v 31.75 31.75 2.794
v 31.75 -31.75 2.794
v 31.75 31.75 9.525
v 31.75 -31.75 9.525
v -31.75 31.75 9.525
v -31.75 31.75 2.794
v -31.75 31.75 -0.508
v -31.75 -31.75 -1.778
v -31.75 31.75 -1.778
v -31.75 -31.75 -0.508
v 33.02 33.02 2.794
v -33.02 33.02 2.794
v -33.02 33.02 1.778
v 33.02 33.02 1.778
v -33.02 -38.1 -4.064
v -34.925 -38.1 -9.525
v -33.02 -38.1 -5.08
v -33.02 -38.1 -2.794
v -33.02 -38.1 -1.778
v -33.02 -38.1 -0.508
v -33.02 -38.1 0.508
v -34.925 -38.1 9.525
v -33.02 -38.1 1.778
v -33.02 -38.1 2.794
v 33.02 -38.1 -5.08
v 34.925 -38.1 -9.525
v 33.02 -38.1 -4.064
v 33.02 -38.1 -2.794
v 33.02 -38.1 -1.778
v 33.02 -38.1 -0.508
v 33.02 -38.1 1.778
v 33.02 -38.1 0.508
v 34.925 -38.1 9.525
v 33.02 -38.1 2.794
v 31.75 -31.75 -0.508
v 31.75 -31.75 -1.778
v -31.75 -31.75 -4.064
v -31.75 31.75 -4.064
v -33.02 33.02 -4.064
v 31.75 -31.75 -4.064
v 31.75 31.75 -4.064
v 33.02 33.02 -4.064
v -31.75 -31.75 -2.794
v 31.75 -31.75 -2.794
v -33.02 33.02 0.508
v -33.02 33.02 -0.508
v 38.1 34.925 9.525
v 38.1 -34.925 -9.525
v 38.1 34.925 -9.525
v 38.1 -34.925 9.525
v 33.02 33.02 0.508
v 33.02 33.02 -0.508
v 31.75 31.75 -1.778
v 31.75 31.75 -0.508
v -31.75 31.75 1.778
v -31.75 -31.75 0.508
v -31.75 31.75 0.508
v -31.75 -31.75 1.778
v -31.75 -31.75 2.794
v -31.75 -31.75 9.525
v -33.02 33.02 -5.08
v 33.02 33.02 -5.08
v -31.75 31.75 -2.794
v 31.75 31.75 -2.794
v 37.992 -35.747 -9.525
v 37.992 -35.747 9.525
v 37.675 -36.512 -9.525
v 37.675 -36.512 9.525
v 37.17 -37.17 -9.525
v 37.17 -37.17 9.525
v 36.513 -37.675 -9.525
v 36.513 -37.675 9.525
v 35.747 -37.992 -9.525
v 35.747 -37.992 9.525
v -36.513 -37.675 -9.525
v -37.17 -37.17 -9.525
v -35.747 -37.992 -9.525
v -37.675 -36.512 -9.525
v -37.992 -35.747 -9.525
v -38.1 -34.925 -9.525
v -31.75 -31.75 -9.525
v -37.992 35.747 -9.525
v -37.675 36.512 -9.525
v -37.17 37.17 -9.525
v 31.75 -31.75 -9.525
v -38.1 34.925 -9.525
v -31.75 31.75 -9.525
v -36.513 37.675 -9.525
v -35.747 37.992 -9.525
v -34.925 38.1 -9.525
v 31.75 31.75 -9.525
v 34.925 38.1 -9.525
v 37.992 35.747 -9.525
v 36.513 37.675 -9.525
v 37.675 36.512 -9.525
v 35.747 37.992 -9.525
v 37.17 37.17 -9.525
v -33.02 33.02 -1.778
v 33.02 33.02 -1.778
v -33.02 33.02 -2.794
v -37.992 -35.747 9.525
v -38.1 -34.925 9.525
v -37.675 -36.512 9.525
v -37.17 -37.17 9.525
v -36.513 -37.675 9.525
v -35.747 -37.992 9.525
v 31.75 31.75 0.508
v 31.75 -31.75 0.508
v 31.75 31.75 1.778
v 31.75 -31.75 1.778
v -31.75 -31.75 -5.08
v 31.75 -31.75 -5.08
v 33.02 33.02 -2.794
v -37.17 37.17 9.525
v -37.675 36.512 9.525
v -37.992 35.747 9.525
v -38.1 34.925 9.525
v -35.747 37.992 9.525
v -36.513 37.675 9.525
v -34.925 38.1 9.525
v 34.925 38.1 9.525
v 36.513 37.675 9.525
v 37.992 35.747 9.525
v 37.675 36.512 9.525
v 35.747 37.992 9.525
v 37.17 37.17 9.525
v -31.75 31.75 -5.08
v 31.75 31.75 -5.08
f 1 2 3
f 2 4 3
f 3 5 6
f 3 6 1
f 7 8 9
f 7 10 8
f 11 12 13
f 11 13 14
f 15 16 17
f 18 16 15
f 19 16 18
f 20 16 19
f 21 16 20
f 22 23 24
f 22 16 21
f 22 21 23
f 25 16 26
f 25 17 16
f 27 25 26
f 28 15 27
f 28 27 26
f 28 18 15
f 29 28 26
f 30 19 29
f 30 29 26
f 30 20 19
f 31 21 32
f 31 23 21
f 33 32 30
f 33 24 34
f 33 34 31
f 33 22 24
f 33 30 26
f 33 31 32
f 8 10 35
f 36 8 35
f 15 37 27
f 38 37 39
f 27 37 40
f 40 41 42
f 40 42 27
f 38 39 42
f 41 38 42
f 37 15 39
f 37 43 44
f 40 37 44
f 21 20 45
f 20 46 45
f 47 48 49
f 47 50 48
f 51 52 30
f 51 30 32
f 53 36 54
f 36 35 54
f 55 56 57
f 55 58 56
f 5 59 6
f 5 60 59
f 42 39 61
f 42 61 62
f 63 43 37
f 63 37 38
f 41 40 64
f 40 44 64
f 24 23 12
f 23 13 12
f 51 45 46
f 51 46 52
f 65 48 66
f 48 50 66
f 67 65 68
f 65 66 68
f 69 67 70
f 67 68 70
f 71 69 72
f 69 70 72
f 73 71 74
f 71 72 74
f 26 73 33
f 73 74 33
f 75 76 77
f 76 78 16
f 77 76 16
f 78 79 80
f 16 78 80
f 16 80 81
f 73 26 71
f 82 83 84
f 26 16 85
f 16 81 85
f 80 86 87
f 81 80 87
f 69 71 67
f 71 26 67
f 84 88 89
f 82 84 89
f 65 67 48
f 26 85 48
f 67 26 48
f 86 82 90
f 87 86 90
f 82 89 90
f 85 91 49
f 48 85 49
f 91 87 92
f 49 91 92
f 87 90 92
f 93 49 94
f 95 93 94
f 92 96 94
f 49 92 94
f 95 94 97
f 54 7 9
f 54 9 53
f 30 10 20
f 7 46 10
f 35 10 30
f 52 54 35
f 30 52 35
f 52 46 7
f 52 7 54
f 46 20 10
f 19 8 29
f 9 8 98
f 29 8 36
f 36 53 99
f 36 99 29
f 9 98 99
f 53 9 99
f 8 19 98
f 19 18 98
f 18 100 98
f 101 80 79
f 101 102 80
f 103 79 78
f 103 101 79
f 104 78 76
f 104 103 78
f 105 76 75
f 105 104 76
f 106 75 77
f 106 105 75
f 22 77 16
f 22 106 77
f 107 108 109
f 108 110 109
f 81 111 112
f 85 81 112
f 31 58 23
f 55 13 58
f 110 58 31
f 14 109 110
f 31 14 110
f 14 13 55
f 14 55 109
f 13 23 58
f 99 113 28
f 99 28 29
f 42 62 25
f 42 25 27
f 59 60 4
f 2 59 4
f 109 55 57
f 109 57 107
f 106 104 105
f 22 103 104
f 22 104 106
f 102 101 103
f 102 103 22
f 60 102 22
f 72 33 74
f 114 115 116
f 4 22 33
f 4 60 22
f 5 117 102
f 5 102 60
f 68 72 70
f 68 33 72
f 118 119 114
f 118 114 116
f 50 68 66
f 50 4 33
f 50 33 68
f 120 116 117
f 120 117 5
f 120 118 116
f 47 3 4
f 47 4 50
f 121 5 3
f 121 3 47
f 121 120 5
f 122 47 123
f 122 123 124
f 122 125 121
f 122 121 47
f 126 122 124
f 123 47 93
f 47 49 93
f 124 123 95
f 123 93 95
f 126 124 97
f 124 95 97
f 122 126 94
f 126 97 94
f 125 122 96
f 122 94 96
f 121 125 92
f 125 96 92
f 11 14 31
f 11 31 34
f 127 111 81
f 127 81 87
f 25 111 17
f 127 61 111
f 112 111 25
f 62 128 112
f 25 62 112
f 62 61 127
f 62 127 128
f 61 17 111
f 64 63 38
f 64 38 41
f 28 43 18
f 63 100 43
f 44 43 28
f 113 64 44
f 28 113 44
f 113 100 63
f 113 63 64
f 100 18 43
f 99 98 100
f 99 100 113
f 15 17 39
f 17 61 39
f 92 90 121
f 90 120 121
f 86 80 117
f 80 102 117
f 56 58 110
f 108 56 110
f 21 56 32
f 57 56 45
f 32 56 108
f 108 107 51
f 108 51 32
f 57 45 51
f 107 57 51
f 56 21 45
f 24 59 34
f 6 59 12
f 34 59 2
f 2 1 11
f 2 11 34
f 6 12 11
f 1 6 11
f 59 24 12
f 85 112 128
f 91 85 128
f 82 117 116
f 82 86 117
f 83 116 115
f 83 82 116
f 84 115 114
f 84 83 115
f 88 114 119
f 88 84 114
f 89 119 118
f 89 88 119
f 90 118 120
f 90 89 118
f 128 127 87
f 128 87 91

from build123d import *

# Parameters (mm, degrees)
F0_W     = 76.2
F0_H     = 76.2
F0_W_2   = 63.5
F0_H_2   = 63.5
F1_DEPTH = 9.525
F2_W     = 66.04
F2_H     = 1.016
F3_DEPTH = 38.1
F4_DEPTH = 31.75
F5_R     = 3.175
F6_DEPTH = 33.02


with BuildPart() as f1:
    # F0 (on Top) → F1 (new body, symmetric)
    with BuildSketch(Plane.XY):
        Rectangle(F0_W, F0_H)
        Rectangle(F0_W_2, F0_H_2, mode=Mode.SUBTRACT)
    extrude(amount=F1_DEPTH, both=True)

    # F2 (on Front) → F3 (cut, through all)
    with BuildSketch(Plane.XZ):
        Rectangle(F2_W, F2_H)
        with Locations((0, 2.286)):
            Rectangle(F2_W, F2_H)
        with Locations((0, -2.286)):
            Rectangle(F2_W, F2_H)
        with Locations((0, -4.572)):
            Rectangle(F2_W, F2_H)
    extrude(amount=F3_DEPTH, mode=Mode.SUBTRACT)

    # F2 (on Front) → F4 (cut)
    with BuildSketch(Plane.XZ):
        Rectangle(F2_W, F2_H)
        with Locations((0, 2.286)):
            Rectangle(F2_W, F2_H)
        with Locations((0, -2.286)):
            Rectangle(F2_W, F2_H)
        with Locations((0, -4.572)):
            Rectangle(F2_W, F2_H)
    extrude(amount=-F4_DEPTH, mode=Mode.SUBTRACT)

    # F5
    f5_edges = [f1.edges().sort_by_distance(p)[0] for p in [
        (-38.1, -38.1, 0),
        (38.1, -38.1, 0),
        (38.1, 38.1, 0),
        (-38.1, 38.1, 0),
    ]]
    fillet(f5_edges, radius=F5_R)

    # F2 (on Front) → F6 (cut)
    with BuildSketch(Plane.XZ):
        Rectangle(F2_W, F2_H)
        with Locations((0, 2.286)):
            Rectangle(F2_W, F2_H)
        with Locations((0, -2.286)):
            Rectangle(F2_W, F2_H)
        with Locations((0, -4.572)):
            Rectangle(F2_W, F2_H)
    extrude(amount=-F6_DEPTH, mode=Mode.SUBTRACT)


solid = f1.part
